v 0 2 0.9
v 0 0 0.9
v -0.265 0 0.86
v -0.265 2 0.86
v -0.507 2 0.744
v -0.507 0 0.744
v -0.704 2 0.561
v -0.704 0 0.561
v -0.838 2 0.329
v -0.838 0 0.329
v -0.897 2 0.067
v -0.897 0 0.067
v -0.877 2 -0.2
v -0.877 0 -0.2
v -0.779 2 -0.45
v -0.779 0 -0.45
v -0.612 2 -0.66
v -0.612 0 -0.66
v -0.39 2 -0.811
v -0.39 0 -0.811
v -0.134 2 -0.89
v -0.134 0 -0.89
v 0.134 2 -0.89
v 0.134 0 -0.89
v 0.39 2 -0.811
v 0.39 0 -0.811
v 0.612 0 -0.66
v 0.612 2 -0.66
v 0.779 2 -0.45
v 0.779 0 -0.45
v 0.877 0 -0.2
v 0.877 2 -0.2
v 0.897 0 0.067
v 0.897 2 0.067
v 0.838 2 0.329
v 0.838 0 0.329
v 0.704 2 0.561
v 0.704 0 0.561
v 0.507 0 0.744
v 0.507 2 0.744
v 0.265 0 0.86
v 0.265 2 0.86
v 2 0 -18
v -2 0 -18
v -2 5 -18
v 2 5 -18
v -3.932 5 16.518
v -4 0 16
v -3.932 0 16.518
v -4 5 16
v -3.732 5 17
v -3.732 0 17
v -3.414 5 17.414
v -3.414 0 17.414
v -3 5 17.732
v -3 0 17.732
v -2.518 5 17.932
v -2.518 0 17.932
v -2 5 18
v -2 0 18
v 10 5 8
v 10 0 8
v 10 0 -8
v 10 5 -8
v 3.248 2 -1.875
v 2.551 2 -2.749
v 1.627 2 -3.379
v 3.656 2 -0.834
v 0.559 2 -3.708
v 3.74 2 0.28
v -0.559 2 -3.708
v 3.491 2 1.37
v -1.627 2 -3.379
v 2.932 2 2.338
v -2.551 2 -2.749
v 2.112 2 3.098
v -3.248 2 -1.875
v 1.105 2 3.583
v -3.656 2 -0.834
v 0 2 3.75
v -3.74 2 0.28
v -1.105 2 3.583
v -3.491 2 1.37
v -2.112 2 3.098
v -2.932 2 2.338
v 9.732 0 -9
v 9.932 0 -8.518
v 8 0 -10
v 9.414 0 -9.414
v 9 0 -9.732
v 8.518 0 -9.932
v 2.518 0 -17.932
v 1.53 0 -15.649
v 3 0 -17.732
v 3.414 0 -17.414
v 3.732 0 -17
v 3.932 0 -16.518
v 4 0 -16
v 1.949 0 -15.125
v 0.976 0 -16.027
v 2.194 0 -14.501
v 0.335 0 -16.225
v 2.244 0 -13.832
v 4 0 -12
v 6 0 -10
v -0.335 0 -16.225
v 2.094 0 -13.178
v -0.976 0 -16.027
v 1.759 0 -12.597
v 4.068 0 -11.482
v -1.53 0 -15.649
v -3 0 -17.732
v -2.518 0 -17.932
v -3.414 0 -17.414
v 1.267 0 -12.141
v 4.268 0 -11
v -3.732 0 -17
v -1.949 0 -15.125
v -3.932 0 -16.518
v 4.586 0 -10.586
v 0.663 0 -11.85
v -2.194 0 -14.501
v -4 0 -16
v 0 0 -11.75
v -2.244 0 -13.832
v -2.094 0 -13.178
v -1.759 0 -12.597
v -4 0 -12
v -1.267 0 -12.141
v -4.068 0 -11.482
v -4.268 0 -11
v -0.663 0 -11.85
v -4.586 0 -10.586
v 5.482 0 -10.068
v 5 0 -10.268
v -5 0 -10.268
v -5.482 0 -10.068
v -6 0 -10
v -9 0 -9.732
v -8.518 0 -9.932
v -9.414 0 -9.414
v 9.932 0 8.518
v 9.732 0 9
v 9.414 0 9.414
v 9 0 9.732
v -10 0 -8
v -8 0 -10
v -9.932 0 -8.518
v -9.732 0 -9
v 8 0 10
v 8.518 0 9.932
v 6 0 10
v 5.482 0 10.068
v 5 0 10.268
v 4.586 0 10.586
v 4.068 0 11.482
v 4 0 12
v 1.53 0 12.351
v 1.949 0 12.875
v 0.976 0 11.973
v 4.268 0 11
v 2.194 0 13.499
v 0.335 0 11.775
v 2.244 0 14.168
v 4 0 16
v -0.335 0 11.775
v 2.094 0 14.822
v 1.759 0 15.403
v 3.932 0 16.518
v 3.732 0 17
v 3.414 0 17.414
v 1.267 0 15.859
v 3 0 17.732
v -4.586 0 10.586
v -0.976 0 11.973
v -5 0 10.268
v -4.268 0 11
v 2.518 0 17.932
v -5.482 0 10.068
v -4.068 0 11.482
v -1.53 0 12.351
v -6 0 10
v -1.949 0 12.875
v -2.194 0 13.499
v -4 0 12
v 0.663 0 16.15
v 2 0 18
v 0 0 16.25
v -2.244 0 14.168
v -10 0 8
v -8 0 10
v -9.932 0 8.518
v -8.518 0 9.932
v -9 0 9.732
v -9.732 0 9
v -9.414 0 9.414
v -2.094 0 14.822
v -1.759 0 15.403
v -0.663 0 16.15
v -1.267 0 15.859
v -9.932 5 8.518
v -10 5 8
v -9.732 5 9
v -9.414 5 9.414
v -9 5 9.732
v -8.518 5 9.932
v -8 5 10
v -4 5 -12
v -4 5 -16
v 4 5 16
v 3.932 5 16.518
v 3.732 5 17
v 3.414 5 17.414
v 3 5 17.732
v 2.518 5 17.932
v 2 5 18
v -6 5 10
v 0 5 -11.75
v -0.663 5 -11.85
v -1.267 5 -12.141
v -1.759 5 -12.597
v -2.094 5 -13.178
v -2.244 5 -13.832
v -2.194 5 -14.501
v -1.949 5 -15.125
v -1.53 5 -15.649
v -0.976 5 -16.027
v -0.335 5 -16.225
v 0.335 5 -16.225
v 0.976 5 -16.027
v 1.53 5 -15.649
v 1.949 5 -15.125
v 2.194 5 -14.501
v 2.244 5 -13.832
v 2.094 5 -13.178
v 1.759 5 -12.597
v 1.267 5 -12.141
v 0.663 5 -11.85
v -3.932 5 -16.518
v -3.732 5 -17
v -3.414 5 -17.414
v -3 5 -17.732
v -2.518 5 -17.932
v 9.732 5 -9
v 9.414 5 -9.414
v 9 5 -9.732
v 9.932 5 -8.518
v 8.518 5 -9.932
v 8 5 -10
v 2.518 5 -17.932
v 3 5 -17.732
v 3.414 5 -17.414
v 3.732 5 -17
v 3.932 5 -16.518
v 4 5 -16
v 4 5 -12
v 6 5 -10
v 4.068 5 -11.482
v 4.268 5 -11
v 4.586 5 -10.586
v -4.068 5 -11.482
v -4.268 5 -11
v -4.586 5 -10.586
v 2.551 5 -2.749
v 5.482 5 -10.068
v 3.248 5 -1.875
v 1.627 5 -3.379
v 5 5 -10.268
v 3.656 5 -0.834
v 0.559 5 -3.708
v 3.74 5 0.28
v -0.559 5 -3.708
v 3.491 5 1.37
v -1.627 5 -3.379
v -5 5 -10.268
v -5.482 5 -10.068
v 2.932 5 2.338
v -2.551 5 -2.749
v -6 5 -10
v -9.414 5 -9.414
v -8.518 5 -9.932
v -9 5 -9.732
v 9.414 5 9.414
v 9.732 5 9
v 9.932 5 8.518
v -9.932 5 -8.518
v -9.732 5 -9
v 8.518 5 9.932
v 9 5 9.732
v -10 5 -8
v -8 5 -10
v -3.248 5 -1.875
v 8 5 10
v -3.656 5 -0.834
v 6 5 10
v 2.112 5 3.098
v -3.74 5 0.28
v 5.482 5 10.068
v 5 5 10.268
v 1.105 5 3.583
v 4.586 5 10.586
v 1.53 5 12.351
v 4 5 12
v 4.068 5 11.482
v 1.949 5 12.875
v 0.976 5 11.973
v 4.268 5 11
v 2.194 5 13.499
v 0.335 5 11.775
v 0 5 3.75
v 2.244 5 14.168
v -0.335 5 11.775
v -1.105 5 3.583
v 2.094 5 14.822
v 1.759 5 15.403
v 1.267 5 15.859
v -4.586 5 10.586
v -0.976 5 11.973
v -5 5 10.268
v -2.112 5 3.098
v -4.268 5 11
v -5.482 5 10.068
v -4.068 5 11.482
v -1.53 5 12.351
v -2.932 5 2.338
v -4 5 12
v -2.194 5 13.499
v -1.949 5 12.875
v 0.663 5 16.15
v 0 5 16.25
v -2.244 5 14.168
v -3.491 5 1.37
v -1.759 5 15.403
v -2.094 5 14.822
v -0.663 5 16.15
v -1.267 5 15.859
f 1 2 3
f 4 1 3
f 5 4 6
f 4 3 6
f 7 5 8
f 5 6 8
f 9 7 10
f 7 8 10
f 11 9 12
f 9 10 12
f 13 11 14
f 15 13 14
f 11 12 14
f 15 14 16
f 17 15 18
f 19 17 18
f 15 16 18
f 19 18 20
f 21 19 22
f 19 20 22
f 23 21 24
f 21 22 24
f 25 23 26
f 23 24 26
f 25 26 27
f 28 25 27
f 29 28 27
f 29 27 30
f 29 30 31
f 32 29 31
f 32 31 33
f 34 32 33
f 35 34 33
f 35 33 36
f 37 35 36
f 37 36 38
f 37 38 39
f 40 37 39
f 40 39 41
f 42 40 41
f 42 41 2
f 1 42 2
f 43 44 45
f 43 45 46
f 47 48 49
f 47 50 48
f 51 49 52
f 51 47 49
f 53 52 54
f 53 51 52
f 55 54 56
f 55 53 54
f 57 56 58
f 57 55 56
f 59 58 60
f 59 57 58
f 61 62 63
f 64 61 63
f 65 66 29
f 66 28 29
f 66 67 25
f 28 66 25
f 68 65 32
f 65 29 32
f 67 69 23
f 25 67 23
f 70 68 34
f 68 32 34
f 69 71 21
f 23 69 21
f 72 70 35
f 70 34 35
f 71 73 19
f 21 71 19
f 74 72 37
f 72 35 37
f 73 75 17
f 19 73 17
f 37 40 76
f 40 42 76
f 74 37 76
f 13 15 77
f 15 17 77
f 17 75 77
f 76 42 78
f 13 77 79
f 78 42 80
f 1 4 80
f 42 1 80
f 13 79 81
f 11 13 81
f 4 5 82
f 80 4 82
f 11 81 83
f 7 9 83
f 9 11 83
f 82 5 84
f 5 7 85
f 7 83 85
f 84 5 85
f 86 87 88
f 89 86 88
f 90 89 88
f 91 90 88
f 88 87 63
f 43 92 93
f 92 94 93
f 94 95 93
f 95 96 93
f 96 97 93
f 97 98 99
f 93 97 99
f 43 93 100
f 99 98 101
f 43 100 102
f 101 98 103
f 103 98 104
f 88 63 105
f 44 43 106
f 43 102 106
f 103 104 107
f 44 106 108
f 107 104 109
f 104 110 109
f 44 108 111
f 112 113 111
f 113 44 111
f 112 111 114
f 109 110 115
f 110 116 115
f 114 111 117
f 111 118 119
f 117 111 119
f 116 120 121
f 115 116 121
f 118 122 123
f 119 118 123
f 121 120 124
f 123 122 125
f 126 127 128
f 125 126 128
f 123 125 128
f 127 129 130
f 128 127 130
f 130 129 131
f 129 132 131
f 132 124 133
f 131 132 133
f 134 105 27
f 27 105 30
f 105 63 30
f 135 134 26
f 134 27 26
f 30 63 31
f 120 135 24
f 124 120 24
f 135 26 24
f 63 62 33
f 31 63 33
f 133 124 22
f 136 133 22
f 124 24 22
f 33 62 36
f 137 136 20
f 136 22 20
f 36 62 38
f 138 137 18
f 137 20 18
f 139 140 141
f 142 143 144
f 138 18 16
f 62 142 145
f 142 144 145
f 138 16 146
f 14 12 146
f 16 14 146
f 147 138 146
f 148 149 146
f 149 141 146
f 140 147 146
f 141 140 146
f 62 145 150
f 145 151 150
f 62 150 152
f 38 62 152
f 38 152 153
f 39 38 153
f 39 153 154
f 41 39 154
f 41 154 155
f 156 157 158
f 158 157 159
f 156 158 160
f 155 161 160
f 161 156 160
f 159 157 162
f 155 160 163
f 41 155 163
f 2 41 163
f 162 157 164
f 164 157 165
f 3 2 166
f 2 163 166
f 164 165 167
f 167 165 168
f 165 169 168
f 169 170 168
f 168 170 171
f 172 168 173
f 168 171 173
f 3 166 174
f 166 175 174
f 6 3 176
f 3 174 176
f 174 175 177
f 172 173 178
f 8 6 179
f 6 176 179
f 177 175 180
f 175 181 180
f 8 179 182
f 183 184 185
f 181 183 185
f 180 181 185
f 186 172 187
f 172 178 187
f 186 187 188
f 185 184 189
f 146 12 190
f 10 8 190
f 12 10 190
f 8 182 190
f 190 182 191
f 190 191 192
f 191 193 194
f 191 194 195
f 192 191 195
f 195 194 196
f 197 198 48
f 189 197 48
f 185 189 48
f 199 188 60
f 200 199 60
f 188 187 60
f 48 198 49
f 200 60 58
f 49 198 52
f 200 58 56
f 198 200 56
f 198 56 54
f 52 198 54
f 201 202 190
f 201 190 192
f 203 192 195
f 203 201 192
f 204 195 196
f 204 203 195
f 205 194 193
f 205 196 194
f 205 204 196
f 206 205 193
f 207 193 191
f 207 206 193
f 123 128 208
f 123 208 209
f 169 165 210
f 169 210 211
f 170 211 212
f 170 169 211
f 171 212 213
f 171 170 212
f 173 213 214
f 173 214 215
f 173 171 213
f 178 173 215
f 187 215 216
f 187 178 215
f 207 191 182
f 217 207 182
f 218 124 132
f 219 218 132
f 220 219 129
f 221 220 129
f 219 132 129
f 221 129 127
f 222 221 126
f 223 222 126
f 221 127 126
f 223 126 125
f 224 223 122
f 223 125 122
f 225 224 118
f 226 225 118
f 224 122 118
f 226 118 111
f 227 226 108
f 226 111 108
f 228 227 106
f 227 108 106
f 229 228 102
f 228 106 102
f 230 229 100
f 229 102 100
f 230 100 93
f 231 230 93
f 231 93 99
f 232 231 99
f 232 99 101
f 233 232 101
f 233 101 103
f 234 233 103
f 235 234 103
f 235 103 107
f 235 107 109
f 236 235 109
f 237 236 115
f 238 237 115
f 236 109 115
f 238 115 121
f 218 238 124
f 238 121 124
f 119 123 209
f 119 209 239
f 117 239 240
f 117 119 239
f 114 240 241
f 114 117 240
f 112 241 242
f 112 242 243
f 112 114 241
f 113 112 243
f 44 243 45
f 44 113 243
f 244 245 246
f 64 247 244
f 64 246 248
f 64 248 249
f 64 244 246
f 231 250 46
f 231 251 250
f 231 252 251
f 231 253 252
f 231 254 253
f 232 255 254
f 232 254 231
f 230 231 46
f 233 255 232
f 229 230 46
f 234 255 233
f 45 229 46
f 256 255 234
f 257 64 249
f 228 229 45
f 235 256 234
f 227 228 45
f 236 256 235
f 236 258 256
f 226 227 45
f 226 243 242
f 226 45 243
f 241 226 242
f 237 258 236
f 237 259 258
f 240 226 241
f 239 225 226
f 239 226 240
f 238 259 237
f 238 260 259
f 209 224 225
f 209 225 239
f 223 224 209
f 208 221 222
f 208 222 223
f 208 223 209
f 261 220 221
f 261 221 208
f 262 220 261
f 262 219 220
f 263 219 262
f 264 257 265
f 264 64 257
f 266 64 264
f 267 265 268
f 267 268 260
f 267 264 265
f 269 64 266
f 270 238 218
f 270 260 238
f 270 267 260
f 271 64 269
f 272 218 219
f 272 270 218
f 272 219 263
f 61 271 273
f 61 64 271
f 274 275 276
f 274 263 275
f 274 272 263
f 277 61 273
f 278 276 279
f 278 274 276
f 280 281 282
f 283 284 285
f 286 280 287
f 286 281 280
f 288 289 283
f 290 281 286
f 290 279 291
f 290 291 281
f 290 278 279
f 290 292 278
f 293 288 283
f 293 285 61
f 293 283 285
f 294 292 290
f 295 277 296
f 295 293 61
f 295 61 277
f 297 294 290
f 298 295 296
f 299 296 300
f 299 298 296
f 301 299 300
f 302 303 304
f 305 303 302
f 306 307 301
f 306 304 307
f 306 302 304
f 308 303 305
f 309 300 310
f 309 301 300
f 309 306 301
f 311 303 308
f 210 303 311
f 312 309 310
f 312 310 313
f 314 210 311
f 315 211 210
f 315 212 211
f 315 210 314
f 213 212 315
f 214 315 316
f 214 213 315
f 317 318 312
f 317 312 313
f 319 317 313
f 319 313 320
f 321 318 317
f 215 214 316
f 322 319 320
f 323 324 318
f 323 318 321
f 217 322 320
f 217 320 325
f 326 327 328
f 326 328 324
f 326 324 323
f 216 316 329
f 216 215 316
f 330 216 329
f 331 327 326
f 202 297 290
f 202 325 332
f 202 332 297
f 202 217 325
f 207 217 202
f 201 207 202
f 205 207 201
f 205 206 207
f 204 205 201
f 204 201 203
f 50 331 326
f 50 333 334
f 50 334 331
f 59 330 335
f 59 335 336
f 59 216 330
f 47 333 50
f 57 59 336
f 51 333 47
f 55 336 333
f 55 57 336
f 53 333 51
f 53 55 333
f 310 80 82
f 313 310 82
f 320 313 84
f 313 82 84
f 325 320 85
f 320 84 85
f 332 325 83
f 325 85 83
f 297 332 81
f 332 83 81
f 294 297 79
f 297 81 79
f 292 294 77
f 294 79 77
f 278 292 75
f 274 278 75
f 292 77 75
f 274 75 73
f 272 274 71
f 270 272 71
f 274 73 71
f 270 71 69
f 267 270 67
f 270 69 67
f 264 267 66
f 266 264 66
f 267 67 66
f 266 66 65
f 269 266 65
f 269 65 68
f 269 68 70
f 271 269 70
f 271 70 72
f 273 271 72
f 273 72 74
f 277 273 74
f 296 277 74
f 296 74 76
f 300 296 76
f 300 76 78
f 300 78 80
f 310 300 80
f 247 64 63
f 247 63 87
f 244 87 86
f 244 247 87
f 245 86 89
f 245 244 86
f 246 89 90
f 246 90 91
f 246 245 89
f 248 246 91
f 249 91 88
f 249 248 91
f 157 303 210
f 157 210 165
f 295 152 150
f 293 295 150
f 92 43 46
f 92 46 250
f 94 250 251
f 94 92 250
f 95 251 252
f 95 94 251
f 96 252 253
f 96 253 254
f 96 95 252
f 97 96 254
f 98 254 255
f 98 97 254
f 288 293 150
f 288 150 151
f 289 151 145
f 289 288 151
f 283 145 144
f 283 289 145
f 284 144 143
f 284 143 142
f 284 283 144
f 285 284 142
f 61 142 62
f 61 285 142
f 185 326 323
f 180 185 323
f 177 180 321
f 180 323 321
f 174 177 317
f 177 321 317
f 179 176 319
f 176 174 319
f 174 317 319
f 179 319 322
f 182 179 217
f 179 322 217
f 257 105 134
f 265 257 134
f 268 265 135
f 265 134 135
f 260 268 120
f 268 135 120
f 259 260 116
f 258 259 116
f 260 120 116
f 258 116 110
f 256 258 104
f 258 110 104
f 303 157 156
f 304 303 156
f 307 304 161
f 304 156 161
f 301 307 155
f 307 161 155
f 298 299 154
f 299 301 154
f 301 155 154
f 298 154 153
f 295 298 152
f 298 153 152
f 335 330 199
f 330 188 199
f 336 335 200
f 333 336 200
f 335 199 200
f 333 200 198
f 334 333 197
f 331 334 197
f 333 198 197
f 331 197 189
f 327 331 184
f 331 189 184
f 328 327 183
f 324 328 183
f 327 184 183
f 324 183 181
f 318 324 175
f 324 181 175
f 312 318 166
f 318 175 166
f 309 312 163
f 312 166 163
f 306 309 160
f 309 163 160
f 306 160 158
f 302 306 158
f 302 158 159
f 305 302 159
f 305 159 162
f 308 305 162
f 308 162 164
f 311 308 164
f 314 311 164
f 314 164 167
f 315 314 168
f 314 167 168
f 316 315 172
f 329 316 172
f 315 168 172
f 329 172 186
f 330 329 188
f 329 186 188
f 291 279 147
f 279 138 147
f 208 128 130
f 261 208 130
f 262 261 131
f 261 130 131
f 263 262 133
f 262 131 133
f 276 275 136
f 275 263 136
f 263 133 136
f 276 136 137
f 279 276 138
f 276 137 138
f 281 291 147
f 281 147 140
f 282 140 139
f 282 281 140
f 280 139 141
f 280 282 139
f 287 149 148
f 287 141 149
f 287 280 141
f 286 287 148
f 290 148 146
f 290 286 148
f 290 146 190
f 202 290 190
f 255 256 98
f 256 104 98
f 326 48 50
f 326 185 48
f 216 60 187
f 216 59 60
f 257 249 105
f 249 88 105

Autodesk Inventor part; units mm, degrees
ref_plane "YZ Plane" through (0, 0, 0) normal (1, 0, 0) x (0, 1, 0)
ref_plane "XZ Plane" through (0, 0, 0) normal (0, 1, 0) x (-1, 0, 0)
ref_plane "XY Plane" through (0, 0, 0) normal (0, 0, 1) x (1, 0, 0)
sketch "Sketch1" plane through (0, 0, 0) normal (0, 1, 0) x (-1, 0, 0)
  line L0 (-10, 10) -> (-10, -10)
  line L1 (-10, -10) -> (10, -10)
  line L2 (10, -10) -> (10, 10)
  line L3 (10, 10) -> (-10, 10)
  line L4 (-10, 10) -> (10, -10) construction
  line L5 (-10, -10) -> (10, 10) construction
  point P0 (0, 0)
  dimension "d0" = 20
  dimension "d1" = 20
extrude "Extrusion1" add sketch "Sketch1" along normal blind 5
sketch "Sketch2" plane through (-10, 0, 10) normal (0, 0, 1) x (1, 0, 0)
  point P0 (10, 0)
sketch "Sketch3" plane through (0, 5, 0) normal (0, 1, 0) x (1, 0, 0)
  point P0 (0, 0)
  point P1 (0, 0)
hole "Hole1" at (0, 5, 0) direction (0, -1, 0) diameter 1.8 end through all counterbore diameter 7.5 counterbore depth 3 clearance for "Socket Head Cap Screw" size "M1.6" standard "Ansi Metric M Profile"
sketch "Sketch4" plane through (-10, 0, 10) normal (0, 0, 1) x (1, 0, 0)
  line L0 (10, 0) -> (10, 1.5)
  line L1 (14, 3) -> (14, 0)
  line L2 (14, 0) -> (6, 0)
  line L3 (6, 0) -> (6, 3)
  line L4 (6, 3) -> (14, 3)
  line L5 (14, 3) -> (6, 0) construction
  line L6 (14, 0) -> (6, 3) construction
  dimension "d11" = 8
extrude "Extrusion2" add sketch "Sketch4" along normal blind 8
mirror "Mirror1" about plane through (0, 0, 0) normal (0, 0, 1) of "Extrusion2"
sketch "Sketch5" plane through (0, 5, 0) normal (0, 1, 0) x (1, 0, 0)
  line L0 (0, 0) -> (0, -14)
  line L1 (0, 0) -> (0, 14)
  dimension "d14" = 14
  dimension "d15" = 14
hole "Hole2" at (0, 5, 14) at (0, 5, -14) direction (0, -1, 0) diameter 4.5 end through all clearance for "Socket Head Cap Screw" size "M4" standard "Ansi Metric M Profile"
fillet "Fillet1" radius 2 12 edges at (4, 1.5, 10) (4, 1.5, 18) (10, 2.5, 10) (10, 2.5, -10) (4, 1.5, -10) (4, 1.5, -18) (-4, 1.5, -18) (-4, 1.5, -10) (-10, 2.5, -10) (-10, 2.5, 10) (-4, 1.5, 10) (-4, 1.5, 18)
move faces "Move1" translate (0, 2, 0) faces at (0, 3, 10.5833)
move faces "Move2" translate (0, 2, 0) faces at (3.4661, 2, -17.3603) (4.5339, 2, -10.6397) (0, 3, -10.8742)
properties part number "microsoft-lifecam-baseplate"
